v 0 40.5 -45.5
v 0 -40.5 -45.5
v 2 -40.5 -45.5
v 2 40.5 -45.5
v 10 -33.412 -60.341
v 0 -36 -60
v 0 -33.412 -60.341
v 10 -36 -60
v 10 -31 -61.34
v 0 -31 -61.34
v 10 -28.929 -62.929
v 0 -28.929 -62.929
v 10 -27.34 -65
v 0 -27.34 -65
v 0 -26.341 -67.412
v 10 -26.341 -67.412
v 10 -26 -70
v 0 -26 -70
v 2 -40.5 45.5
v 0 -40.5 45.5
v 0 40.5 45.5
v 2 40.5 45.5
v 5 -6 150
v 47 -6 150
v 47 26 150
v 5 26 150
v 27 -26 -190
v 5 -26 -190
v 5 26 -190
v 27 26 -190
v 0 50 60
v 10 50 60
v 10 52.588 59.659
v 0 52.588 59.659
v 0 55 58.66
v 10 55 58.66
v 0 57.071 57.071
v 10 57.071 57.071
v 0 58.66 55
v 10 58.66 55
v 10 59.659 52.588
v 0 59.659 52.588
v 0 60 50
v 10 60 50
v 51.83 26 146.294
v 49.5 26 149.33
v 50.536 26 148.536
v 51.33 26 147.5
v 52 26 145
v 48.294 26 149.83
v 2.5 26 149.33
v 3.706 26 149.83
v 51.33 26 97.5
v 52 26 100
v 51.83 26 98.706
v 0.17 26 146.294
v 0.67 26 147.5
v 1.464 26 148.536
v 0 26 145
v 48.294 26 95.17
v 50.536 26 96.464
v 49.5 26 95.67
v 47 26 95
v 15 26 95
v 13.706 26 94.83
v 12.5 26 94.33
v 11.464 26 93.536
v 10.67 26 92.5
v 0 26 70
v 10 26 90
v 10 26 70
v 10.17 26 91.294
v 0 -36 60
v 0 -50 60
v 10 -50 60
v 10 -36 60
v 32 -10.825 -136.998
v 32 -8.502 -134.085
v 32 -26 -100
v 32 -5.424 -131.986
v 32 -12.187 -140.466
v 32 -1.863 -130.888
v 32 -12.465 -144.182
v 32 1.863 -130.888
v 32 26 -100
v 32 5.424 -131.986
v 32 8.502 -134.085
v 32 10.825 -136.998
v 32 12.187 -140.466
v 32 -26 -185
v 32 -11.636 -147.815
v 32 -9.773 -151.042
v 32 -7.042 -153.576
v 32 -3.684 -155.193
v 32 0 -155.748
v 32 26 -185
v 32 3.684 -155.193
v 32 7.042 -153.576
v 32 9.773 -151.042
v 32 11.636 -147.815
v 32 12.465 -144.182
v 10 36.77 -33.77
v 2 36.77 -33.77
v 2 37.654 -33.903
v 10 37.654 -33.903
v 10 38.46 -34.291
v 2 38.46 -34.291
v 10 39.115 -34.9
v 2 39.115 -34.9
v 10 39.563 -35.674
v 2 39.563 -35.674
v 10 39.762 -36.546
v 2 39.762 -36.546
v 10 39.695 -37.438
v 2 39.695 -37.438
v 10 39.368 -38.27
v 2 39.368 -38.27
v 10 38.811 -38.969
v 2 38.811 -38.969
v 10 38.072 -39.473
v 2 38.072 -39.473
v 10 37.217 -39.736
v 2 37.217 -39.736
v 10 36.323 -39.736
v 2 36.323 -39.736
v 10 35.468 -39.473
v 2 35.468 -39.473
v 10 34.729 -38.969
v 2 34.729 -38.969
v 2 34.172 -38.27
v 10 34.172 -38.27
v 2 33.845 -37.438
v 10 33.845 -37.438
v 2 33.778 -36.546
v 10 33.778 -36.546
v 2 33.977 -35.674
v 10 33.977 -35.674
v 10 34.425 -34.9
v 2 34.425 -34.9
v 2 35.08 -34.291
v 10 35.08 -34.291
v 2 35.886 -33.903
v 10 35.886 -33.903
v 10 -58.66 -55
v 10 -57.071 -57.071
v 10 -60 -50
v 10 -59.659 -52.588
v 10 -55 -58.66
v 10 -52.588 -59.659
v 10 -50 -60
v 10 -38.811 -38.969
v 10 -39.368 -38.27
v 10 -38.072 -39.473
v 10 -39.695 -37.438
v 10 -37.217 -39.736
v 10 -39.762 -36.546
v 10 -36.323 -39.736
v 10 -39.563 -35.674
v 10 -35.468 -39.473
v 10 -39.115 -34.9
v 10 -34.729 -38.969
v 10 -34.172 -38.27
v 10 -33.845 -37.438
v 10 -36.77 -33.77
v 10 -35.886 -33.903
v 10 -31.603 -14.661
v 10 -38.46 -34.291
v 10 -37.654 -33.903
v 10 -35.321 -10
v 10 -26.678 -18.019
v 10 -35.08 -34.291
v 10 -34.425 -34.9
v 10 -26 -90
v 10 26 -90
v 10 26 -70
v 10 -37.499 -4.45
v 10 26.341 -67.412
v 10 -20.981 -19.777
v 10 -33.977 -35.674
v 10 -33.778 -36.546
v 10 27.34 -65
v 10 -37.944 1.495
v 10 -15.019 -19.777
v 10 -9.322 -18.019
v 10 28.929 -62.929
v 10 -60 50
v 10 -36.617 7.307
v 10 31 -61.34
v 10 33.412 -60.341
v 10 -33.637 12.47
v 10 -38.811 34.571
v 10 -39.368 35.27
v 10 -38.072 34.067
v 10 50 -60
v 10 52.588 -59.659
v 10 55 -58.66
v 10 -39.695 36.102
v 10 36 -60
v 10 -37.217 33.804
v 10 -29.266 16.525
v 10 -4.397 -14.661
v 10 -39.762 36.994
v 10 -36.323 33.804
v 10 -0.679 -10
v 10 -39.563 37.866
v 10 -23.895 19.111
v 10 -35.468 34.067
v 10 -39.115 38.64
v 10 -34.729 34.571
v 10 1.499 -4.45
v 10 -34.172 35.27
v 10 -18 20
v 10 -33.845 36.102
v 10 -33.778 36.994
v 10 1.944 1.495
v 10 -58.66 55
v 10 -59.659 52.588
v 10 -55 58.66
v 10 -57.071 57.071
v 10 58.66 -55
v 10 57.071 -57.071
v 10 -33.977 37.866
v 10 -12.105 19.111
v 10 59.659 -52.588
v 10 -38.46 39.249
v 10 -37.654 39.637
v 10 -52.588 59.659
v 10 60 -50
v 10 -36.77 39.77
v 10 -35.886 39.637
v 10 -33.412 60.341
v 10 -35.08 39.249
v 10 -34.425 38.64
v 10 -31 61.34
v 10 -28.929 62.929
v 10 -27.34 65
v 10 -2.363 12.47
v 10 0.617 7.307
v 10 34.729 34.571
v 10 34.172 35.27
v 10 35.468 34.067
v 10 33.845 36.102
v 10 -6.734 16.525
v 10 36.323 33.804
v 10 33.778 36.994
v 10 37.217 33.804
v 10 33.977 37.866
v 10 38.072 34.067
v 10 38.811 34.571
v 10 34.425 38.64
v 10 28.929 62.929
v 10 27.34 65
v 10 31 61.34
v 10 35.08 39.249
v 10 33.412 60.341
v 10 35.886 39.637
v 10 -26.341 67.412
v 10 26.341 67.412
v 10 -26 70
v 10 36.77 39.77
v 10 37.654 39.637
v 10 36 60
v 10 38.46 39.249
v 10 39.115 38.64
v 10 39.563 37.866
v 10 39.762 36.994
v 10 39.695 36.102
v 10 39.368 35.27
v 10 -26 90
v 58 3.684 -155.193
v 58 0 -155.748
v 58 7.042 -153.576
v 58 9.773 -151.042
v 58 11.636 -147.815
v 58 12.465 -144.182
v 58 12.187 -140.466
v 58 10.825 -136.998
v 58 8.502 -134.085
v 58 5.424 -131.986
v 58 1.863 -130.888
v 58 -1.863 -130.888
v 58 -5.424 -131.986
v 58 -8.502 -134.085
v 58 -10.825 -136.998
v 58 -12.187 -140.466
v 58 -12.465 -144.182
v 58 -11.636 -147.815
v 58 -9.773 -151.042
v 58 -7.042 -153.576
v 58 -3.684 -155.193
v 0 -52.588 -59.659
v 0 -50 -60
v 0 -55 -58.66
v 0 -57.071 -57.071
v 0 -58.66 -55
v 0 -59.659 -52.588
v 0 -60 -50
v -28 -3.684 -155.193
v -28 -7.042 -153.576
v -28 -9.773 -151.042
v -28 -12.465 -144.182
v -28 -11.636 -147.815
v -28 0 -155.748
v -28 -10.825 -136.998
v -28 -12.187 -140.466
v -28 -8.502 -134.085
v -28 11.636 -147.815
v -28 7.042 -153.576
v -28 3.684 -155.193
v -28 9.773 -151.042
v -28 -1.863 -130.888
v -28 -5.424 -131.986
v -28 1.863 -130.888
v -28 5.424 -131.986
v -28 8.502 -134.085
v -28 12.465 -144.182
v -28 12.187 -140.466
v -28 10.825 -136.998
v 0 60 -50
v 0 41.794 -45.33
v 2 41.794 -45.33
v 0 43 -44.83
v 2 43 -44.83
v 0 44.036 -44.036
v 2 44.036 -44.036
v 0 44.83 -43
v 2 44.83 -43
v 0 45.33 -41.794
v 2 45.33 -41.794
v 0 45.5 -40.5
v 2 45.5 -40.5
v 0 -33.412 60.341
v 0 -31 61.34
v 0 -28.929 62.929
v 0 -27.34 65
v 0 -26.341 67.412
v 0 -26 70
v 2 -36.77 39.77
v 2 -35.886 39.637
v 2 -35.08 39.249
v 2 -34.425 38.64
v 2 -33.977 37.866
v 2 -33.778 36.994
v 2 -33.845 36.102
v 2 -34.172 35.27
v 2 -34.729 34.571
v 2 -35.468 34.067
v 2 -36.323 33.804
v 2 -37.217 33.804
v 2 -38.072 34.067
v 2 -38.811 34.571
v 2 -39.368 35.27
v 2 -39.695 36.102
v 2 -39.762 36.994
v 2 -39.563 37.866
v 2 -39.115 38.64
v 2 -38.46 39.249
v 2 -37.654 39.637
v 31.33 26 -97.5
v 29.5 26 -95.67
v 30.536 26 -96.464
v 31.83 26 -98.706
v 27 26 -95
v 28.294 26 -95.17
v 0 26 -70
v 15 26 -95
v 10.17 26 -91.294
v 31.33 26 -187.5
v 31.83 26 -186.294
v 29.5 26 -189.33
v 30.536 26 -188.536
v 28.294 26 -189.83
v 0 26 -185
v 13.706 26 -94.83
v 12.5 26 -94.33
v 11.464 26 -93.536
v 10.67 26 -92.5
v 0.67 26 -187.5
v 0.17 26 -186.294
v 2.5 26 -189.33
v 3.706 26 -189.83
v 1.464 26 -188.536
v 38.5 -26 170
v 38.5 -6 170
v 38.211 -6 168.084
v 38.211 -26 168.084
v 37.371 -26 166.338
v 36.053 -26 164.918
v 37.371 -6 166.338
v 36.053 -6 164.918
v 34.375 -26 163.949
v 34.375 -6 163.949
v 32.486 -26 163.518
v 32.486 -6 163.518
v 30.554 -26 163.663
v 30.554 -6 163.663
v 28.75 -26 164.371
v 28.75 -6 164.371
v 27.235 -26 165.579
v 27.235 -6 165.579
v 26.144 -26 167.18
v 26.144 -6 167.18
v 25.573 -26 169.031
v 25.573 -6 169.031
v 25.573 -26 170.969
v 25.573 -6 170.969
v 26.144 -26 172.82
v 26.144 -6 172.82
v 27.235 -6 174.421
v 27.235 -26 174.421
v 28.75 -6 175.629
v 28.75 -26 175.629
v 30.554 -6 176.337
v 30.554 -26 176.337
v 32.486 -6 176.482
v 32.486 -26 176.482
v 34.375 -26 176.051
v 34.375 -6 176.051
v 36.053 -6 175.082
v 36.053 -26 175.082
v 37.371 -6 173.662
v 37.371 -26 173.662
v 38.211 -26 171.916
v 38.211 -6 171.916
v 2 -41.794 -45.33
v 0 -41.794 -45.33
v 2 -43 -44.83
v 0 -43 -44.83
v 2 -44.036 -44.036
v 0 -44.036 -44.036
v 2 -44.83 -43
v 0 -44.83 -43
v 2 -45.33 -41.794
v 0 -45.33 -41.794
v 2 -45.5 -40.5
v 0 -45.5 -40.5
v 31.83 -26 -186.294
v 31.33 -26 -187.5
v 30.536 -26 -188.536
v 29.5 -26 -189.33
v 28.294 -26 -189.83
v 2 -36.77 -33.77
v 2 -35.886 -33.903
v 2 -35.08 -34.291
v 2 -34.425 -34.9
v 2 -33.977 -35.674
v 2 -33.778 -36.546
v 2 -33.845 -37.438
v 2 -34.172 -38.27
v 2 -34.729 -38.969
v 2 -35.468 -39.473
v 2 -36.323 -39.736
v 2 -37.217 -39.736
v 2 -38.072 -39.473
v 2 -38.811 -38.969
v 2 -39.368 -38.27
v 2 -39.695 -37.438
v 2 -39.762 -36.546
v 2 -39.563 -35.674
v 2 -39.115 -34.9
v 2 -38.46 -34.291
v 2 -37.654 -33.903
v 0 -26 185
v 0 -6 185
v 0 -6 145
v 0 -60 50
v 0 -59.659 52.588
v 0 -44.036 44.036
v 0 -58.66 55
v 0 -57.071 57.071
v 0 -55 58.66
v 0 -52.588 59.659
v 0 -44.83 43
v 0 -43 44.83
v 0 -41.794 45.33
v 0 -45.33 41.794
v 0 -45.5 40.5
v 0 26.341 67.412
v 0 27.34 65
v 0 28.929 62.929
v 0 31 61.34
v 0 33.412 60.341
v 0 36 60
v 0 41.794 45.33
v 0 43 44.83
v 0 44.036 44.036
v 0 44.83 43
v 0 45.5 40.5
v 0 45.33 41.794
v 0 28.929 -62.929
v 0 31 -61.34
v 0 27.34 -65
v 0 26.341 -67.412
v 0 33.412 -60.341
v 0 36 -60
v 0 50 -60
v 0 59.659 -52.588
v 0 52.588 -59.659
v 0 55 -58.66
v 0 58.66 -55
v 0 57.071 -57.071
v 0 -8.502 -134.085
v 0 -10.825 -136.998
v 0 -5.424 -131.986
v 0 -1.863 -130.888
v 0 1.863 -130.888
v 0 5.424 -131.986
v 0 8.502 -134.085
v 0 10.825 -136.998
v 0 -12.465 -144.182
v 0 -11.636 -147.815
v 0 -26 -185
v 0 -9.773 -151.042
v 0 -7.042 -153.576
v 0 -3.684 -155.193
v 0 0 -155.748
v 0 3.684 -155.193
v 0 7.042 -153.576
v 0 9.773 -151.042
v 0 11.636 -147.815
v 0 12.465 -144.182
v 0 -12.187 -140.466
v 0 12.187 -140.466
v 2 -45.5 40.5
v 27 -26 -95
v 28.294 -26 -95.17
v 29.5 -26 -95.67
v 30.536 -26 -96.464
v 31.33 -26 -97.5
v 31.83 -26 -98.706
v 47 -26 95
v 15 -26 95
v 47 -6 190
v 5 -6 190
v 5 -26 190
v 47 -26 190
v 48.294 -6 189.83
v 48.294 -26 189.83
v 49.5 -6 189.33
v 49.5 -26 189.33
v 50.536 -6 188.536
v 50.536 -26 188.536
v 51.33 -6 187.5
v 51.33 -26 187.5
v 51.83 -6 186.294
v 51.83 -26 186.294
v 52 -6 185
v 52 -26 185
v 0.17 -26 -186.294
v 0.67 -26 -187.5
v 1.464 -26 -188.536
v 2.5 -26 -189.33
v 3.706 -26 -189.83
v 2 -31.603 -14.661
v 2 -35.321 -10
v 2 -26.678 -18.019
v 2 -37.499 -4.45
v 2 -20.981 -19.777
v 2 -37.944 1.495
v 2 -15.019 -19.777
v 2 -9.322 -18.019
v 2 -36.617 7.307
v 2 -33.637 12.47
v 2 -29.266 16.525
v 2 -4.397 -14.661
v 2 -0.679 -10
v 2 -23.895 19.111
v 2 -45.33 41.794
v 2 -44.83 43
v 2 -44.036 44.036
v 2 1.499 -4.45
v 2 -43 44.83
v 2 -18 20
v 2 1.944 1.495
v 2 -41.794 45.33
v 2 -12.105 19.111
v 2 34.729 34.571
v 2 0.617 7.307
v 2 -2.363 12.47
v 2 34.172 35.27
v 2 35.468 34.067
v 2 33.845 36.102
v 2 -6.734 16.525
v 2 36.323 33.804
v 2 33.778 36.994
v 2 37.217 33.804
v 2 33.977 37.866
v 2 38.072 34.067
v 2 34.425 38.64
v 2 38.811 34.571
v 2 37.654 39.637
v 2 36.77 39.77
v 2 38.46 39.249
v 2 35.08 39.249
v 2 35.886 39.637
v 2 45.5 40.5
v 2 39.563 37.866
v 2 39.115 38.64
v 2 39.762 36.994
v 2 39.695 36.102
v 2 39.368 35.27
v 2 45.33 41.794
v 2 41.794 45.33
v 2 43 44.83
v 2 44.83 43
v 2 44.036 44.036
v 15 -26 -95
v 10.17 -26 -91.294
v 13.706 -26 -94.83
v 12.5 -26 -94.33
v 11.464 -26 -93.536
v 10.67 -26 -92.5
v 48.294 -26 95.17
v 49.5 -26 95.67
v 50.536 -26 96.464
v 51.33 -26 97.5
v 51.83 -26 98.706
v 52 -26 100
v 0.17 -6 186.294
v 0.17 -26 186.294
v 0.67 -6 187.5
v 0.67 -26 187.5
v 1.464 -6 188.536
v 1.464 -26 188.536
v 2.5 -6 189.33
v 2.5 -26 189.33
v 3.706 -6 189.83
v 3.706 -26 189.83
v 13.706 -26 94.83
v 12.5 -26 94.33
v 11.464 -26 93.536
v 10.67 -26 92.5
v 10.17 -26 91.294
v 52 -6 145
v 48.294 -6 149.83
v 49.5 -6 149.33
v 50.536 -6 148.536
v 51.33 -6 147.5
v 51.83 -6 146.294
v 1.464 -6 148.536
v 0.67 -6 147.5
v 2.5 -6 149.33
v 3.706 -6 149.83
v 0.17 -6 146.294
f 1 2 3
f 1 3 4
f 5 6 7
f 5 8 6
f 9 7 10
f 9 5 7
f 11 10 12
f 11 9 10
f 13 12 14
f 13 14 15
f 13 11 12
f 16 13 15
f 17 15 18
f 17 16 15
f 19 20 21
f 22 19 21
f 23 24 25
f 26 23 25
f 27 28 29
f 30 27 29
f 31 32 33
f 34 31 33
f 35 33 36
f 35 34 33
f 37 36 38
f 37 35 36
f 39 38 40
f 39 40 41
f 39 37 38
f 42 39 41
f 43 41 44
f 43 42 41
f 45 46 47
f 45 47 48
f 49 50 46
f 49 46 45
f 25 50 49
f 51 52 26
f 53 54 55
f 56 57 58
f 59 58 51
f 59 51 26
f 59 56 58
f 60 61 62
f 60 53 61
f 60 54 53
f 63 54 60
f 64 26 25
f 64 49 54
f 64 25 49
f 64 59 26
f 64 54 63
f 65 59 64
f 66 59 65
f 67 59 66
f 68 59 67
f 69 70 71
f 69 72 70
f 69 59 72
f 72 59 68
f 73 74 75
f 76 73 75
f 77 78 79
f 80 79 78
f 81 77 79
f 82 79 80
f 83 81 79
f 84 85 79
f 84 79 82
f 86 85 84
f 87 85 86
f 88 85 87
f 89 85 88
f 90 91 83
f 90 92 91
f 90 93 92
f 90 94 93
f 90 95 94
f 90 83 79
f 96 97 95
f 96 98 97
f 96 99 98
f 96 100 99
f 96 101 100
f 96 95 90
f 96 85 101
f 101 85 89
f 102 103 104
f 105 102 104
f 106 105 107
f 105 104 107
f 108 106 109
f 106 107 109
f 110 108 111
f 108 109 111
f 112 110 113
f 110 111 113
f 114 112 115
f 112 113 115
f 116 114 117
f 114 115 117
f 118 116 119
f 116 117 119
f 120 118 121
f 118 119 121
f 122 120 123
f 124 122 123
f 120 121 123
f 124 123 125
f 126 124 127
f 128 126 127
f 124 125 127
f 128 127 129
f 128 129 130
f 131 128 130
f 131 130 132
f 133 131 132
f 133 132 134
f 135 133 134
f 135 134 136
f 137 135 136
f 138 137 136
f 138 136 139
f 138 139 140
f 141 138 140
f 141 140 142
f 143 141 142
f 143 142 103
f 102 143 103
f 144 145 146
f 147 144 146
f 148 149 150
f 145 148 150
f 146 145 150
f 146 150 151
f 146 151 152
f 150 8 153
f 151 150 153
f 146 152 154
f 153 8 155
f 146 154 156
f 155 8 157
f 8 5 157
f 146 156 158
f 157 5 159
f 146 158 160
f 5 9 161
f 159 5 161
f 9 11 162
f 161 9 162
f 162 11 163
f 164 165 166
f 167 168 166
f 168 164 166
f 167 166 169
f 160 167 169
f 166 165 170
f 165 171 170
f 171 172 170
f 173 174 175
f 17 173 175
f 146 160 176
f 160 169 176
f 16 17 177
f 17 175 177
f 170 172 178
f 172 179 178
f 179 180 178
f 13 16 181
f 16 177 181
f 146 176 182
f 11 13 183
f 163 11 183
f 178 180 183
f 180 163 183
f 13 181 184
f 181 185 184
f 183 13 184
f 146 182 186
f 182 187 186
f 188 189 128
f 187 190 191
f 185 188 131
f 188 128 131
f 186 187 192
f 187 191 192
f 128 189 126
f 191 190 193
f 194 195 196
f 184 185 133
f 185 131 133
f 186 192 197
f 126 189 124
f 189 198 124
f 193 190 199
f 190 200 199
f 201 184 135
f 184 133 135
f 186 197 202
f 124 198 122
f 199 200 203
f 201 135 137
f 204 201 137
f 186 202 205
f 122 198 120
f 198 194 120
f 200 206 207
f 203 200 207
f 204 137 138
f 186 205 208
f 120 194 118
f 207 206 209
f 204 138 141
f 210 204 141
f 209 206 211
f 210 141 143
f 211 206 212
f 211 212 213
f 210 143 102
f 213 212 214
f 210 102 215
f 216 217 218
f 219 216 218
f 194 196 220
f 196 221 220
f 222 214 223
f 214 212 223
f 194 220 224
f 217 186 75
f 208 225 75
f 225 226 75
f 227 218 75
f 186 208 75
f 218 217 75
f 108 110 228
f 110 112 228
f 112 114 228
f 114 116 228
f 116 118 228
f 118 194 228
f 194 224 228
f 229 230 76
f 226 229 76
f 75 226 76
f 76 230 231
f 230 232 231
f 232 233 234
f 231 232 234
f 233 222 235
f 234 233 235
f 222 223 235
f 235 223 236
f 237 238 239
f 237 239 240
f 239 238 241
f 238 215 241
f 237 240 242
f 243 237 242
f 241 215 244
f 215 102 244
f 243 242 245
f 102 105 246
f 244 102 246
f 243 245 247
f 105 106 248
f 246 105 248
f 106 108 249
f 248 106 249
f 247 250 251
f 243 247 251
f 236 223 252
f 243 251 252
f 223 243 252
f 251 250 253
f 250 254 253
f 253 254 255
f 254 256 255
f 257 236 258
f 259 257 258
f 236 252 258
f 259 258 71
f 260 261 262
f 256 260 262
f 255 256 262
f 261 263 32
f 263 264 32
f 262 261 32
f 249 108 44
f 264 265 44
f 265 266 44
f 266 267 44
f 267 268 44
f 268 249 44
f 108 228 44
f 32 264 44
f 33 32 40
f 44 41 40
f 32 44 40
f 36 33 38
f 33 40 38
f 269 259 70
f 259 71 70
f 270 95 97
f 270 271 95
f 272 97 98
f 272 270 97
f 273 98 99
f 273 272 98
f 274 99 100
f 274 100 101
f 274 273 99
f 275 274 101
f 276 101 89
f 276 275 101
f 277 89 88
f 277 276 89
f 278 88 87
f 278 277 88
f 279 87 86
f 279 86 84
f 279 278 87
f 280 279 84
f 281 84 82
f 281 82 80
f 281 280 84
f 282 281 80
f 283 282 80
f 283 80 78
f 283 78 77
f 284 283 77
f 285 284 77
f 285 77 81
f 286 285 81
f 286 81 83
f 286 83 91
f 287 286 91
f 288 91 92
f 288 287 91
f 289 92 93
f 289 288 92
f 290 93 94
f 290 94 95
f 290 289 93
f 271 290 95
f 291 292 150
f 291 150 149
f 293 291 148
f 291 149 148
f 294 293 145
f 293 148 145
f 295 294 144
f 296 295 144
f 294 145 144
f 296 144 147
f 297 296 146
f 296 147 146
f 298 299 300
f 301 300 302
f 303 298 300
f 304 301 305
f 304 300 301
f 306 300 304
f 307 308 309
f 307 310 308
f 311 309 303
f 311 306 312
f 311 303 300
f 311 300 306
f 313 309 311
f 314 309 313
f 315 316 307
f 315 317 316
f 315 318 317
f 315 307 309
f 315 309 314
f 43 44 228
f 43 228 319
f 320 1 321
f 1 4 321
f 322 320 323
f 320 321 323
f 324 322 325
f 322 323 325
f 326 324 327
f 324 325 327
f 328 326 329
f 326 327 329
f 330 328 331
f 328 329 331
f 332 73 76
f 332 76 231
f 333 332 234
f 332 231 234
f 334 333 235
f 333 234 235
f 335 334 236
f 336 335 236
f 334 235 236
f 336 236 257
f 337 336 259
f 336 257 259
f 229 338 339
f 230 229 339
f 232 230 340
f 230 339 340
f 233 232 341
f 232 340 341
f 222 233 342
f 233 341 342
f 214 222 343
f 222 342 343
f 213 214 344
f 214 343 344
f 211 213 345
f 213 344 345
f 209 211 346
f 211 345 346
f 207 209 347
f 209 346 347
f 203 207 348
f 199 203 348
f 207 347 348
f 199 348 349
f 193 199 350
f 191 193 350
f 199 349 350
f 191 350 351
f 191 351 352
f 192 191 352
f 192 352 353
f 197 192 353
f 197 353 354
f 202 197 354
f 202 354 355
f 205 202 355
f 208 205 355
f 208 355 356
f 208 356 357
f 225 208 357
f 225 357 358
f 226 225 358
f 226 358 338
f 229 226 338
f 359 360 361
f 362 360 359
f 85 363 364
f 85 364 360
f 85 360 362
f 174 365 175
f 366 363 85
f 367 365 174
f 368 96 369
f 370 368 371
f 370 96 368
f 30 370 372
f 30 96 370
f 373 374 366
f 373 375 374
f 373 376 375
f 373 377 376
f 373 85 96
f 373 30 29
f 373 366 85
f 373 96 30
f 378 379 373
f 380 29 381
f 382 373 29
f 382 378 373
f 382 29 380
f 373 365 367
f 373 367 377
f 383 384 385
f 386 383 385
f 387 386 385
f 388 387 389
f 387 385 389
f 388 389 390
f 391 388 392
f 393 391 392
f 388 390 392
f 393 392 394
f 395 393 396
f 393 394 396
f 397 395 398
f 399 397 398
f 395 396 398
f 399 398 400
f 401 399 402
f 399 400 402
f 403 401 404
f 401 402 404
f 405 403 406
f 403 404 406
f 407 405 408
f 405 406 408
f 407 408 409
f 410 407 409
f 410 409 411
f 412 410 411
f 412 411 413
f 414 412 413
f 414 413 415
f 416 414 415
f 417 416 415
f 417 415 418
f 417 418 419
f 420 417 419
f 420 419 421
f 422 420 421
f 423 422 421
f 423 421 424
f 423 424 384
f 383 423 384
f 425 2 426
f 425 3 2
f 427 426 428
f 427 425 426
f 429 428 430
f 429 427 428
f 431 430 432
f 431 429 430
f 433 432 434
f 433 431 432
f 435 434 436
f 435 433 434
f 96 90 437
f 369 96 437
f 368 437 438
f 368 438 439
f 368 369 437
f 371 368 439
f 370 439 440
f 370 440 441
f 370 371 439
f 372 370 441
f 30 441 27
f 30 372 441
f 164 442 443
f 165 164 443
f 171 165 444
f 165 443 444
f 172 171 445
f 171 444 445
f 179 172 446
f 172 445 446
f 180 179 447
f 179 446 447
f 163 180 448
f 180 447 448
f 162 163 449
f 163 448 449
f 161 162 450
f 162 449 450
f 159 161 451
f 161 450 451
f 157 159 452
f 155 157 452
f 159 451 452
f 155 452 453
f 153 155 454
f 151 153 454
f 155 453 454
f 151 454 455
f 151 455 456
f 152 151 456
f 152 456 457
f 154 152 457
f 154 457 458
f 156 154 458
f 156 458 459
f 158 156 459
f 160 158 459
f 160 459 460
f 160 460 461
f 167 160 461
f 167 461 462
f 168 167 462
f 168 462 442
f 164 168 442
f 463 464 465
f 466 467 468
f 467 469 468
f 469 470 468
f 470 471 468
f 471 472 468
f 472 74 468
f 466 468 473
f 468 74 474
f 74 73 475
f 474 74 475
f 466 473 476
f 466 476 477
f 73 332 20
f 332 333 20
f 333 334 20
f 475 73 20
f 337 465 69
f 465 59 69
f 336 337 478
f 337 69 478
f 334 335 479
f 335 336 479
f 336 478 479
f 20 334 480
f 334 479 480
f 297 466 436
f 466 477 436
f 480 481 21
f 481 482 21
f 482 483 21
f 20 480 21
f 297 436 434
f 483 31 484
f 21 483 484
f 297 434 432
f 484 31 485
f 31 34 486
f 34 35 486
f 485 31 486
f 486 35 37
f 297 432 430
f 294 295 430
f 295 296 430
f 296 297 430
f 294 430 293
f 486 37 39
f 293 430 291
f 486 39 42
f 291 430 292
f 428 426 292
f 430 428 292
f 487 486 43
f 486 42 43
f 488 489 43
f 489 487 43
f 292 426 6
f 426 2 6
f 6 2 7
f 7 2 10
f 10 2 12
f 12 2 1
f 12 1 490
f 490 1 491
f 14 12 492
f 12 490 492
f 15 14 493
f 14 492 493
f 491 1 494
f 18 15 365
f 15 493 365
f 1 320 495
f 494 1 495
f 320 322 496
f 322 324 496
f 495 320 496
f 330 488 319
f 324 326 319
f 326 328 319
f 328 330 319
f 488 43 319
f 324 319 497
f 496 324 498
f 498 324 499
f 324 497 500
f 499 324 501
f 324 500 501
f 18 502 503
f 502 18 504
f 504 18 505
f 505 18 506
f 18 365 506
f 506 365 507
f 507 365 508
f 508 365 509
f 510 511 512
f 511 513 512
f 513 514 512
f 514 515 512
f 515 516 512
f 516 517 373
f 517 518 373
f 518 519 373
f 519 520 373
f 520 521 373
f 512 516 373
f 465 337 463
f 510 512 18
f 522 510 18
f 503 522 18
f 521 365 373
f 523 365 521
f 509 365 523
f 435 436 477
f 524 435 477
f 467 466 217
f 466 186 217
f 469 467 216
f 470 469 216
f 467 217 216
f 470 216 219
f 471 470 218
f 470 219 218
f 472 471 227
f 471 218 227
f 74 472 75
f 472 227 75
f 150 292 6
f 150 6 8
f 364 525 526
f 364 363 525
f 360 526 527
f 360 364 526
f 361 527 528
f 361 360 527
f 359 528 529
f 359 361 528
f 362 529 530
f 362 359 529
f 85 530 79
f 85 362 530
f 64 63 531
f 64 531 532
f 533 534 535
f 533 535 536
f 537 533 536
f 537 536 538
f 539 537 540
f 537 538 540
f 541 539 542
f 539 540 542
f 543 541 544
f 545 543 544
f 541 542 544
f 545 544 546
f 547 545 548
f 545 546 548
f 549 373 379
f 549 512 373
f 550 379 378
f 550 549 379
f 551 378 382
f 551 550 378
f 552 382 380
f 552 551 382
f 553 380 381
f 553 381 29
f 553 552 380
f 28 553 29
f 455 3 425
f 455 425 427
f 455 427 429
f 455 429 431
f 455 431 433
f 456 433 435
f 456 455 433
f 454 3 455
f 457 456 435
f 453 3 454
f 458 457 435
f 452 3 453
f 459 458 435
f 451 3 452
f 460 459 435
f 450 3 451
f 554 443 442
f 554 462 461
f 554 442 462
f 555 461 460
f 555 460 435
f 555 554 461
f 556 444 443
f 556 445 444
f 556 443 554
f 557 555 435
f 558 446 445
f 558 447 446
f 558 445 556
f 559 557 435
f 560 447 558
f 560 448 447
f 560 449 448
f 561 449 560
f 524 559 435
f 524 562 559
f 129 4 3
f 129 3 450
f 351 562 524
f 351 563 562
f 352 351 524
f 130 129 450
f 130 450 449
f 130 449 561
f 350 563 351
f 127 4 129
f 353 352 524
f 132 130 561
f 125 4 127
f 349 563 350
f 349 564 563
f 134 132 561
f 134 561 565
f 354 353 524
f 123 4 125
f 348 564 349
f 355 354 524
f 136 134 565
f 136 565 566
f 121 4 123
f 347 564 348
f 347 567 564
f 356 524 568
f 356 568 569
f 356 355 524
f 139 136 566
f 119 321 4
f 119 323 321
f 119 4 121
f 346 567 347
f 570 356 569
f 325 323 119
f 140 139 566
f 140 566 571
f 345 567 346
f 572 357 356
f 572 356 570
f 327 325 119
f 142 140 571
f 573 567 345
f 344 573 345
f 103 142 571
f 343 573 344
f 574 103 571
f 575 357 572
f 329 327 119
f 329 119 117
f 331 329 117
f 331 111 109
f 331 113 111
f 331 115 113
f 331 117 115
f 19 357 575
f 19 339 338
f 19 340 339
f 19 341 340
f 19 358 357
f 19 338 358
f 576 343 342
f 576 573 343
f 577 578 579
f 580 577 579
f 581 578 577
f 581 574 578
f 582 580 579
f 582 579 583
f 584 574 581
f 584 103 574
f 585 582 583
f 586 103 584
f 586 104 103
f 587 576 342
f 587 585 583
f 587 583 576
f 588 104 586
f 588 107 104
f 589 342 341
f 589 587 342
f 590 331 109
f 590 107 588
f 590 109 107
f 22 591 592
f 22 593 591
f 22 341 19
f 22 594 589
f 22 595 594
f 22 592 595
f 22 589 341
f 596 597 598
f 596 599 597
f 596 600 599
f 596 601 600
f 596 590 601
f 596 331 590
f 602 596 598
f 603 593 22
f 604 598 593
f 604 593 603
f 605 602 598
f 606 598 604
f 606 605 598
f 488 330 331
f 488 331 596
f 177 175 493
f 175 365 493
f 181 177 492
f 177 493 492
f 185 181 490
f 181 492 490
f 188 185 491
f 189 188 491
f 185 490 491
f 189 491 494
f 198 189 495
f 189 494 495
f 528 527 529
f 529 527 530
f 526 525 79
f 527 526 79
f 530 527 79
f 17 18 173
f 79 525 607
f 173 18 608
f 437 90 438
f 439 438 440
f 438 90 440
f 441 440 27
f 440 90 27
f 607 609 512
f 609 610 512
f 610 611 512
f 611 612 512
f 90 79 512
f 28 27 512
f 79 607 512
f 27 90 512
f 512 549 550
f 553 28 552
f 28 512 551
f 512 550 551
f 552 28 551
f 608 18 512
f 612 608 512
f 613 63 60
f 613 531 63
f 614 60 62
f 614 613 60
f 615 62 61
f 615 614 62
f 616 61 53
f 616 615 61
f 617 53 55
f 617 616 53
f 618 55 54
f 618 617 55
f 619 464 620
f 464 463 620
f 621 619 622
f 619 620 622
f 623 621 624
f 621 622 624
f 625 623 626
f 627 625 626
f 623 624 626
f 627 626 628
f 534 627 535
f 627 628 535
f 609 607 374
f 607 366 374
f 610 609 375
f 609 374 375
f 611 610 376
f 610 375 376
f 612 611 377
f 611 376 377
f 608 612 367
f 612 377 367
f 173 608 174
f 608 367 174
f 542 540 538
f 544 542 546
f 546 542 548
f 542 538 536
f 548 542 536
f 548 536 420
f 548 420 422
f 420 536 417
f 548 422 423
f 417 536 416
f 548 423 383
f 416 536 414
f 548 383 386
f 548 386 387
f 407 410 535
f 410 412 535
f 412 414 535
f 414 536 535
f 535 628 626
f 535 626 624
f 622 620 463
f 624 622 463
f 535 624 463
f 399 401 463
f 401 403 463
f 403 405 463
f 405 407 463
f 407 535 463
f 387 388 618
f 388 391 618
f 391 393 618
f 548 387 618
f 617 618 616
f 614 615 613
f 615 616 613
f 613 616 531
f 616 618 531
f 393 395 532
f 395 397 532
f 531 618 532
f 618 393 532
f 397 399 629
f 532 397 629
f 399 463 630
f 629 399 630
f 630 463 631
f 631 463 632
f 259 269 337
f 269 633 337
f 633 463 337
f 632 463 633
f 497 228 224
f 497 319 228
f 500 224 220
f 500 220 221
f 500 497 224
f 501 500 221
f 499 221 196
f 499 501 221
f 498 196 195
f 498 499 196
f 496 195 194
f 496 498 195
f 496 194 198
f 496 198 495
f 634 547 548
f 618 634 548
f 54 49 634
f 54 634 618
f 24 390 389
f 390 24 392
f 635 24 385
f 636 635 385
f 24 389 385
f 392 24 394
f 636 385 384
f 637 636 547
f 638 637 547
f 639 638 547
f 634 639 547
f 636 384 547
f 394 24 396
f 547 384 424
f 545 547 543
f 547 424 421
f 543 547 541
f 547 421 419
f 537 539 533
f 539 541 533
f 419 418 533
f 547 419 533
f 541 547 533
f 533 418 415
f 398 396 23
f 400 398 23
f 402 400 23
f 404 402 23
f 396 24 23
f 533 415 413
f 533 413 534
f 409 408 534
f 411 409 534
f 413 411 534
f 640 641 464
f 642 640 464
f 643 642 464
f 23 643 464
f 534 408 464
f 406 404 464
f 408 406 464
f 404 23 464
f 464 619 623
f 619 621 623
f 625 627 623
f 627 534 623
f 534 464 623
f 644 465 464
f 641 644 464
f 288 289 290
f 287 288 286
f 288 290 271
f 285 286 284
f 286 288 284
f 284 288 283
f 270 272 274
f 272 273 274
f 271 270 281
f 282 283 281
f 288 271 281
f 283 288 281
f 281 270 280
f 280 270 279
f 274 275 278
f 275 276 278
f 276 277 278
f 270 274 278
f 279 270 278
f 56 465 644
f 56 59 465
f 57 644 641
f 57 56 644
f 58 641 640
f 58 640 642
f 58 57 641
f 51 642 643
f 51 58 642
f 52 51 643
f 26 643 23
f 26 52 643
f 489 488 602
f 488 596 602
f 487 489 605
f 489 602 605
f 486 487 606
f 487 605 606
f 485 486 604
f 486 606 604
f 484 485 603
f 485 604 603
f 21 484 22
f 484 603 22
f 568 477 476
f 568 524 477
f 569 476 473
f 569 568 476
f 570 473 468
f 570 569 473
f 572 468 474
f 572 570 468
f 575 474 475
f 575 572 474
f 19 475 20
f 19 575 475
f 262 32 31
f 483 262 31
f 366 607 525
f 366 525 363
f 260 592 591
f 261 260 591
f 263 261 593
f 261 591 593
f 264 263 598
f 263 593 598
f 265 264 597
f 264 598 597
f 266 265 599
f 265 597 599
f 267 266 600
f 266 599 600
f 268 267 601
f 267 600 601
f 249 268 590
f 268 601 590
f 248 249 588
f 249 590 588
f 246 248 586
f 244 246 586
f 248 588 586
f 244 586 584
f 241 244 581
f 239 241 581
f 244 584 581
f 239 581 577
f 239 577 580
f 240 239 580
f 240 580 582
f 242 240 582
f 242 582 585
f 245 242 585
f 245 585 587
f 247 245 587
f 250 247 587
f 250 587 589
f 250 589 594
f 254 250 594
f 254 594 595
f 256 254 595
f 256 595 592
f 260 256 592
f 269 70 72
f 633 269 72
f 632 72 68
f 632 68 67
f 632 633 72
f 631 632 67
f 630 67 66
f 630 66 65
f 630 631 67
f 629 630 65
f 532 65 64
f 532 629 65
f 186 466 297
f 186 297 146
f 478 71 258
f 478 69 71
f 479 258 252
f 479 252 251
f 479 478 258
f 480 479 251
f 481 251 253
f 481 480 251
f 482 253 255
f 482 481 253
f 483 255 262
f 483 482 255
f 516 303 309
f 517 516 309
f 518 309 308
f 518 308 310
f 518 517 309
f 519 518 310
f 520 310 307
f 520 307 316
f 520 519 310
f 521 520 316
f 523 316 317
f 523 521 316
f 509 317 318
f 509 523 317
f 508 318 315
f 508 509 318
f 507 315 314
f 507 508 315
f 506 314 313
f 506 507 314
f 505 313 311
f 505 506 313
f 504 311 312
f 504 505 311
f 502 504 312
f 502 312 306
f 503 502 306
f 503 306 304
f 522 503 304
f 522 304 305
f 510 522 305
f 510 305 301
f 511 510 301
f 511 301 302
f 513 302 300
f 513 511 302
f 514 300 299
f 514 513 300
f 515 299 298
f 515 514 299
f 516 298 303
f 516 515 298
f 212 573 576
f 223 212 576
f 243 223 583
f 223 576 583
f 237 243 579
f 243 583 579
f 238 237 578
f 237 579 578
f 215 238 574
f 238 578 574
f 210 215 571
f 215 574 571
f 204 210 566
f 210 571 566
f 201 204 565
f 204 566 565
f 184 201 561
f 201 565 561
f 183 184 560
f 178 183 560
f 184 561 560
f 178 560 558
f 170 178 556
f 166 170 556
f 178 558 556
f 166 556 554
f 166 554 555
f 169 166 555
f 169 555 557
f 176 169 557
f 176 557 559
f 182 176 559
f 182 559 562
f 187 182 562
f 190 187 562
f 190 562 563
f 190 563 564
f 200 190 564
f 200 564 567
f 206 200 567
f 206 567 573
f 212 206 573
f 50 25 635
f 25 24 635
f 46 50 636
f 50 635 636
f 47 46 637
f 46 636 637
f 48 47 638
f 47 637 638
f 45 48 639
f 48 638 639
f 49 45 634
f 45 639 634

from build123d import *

# Parameters (mm, degrees)
SKETCH_1_W                  = 52
SKETCH_1_H                  = 380
EXTRUDE_1_DEPTH             = 52
SKETCH_2_W                  = 42
SKETCH_2_H                  = 285
CUT_EXTRUDE_1_DEPTH         = 204.735122156
SKETCH_3_W                  = 95
SKETCH_3_H                  = 52
EXTRUDE_2_DEPTH             = 22
SKETCH_4_W                  = 10
SKETCH_4_H                  = 120
EXTRUDE_3_DEPTH             = 34
SKETCH_5_W                  = 10
SKETCH_5_H                  = 120
EXTRUDE_4_DEPTH             = 34
SKETCH_6_W                  = 40
SKETCH_6_H                  = 32
CUT_EXTRUDE_2_DEPTH         = 206.922315449
SKETCH_7_W                  = 91
SKETCH_7_H                  = 91
CUT_EXTRUDE_3_DEPTH         = 2
SKETCH_8_W                  = 28
SKETCH_8_H                  = 12.5
SKETCH_9_W                  = 26
SKETCH_9_H                  = 12.5
HOLE_WIZARD_13_0_13_1_D     = 13
HOLE_WIZARD_13_0_13_1_DEPTH = 86
HOLE_WIZARD_M39_1_D         = 40
HOLE_WIZARD_M39_1_DEPTH     = 38
HOLE_WIZARD_6_0_6_1_D       = 6
HOLE_WIZARD_6_0_6_1_DEPTH   = 38
FILLET_1_R                  = 5
FILLET_2_R                  = 10


with BuildPart() as part:
    # 草图1 → 凸台-拉伸1 (new body)
    with BuildSketch(Plane(origin=(0, 26, 0), x_dir=(1, 0, 0), z_dir=(0, 1, 0))):
        with Locations((26, 0)):
            Rectangle(SKETCH_1_W, SKETCH_1_H)
    extrude(amount=-EXTRUDE_1_DEPTH)

    # 草图2 → 切除-拉伸1 (cut, through all)
    with BuildSketch(Plane(origin=(0, 26, 0), x_dir=(-1, 0, 0), z_dir=(0, 1, 0))):
        with Locations((-31, -47.5)):
            Rectangle(SKETCH_2_W, SKETCH_2_H)
    extrude(amount=-CUT_EXTRUDE_1_DEPTH, mode=Mode.SUBTRACT)

    # 草图3 → 凸台-拉伸2 (add)
    with BuildSketch(Plane(origin=(10, 0, 0), x_dir=(0, 0, -1), z_dir=(1, 0, 0))):
        with Locations((142.5, 0)):
            Rectangle(SKETCH_3_W, SKETCH_3_H)
    extrude(amount=EXTRUDE_2_DEPTH)

    # 草图4 → 凸台-拉伸3 (add)
    with BuildSketch(Plane(origin=(0, 26, 0), x_dir=(-1, 0, 0), z_dir=(0, 1, 0))):
        with Locations((-5, 0)):
            Rectangle(SKETCH_4_W, SKETCH_4_H)
    extrude(amount=EXTRUDE_3_DEPTH)

    # 草图5 → 凸台-拉伸4 (add)
    with BuildSketch(Plane.XZ.offset(26)):
        with Locations((5, 0)):
            Rectangle(SKETCH_5_W, SKETCH_5_H)
    extrude(amount=EXTRUDE_4_DEPTH)

    # 草图6 → 切除-拉伸2 (cut, through all)
    with BuildSketch(Plane.ZY):
        with Locations((170, 10)):
            Rectangle(SKETCH_6_W, SKETCH_6_H)
    extrude(amount=-CUT_EXTRUDE_2_DEPTH, mode=Mode.SUBTRACT)

    # 草图7 → 切除-拉伸3 (cut)
    with BuildSketch(Plane.ZY):
        Rectangle(SKETCH_7_W, SKETCH_7_H)
    extrude(amount=-CUT_EXTRUDE_3_DEPTH, mode=Mode.SUBTRACT)

    # 草图8 → 旋转1 (revolve)
    with BuildSketch(Plane.XY.offset(-143.248009954), mode=Mode.PRIVATE) as revolve_1_sk:
        with Locations((-14, 6.25)):
            Rectangle(SKETCH_8_W, SKETCH_8_H)
    revolve(revolve_1_sk.sketch.rotate(Axis((-28, 0, -143.248009954), (1, 0, 0)), 270), axis=Axis((-28, 0, -143.248009954), (1, 0, 0)))

    # 草图9 → 旋转2 (revolve)
    with BuildSketch(Plane.XY.offset(-143.248009954), mode=Mode.PRIVATE) as revolve_2_sk:
        with Locations((45, 6.25)):
            Rectangle(SKETCH_9_W, SKETCH_9_H)
    revolve(revolve_2_sk.sketch.rotate(Axis((32, 0, -143.248009954), (1, 0, 0)), 270), axis=Axis((32, 0, -143.248009954), (1, 0, 0)))

    # Ø13.0 (13) 直径孔1
    with Locations(Plane(origin=(0, -26, 0), x_dir=(-1, 0, 0), z_dir=(0, -1, 0))):
        with Locations((-32, -170)):
            Hole(HOLE_WIZARD_13_0_13_1_D / 2, depth=HOLE_WIZARD_13_0_13_1_DEPTH)

    # M39 螺旋的螺纹孔钻头1
    with Locations(Plane(origin=(10, 0, 0), x_dir=(0, 0, -1), z_dir=(1, 0, 0))):
        with Locations((0, -18)):
            Hole(HOLE_WIZARD_M39_1_D / 2, depth=HOLE_WIZARD_M39_1_DEPTH)

    # Ø6.0 (6) 直径孔1
    with Locations(Plane(origin=(10, 0, 0), x_dir=(0, 0, -1), z_dir=(1, 0, 0))):
        with Locations((36.77, 36.77), (36.77, -36.77), (-36.77, -36.77), (-36.77, 36.77)):
            Hole(HOLE_WIZARD_6_0_6_1_D / 2, depth=HOLE_WIZARD_6_0_6_1_DEPTH)

    # 圆角1
    fillet_1_edges = [part.edges().sort_by_distance(p)[0] for p in [
        (52, 0, 95),
        (10, 0, 95),
        (10, 0, -95),
        (32, 0, -190),
        (32, 0, -95),
        (52, 10, 150),
        (0, 10, 150),
        (0, -16, 190),
        (0, 0, -190),
        (52, -16, 190),
        (1, 45.5, -45.5),
        (1, 45.5, 45.5),
        (1, -45.5, 45.5),
        (1, -45.5, -45.5),
    ]]
    fillet(fillet_1_edges, radius=FILLET_1_R)

    # 圆角2
    fillet_2_edges = [part.edges().sort_by_distance(p)[0] for p in [
        (5, 26, 60),
        (5, 26, -60),
        (5, 60, 60),
        (5, 60, -60),
        (5, -26, -60),
        (5, -26, 60),
        (5, -60, -60),
        (5, -60, 60),
    ]]
    fillet(fillet_2_edges, radius=FILLET_2_R)


solid = part.part
